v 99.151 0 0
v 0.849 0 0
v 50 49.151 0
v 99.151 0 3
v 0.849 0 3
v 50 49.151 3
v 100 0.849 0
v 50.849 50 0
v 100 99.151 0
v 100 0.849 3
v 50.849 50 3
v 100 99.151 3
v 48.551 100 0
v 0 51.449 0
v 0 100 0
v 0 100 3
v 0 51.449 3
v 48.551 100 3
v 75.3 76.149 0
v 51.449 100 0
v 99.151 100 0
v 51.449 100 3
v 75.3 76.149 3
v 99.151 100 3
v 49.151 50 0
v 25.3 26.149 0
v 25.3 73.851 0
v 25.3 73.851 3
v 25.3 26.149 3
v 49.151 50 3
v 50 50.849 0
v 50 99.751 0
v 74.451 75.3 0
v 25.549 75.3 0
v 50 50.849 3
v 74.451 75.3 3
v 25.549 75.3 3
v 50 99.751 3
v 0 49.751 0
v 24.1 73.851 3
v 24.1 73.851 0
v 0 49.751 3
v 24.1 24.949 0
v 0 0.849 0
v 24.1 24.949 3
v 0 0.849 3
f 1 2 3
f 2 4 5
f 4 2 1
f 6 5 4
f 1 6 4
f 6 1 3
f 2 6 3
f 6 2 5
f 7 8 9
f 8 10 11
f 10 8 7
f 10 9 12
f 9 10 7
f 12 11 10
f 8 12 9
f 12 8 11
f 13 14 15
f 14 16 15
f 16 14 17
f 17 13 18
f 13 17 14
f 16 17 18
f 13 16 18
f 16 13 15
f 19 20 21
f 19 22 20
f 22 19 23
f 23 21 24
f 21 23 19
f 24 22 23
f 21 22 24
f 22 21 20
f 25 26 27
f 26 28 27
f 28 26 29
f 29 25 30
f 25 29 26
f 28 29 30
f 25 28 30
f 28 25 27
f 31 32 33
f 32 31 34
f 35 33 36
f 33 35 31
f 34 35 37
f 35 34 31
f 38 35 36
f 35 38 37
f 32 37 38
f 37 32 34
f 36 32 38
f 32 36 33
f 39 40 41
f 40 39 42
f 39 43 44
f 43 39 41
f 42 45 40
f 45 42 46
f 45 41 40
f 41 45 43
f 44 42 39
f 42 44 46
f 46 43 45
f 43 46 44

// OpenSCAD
/**
 * Genera las piezas del tangram.
 *
 * @author  Joaquín Fernández
 * @url     https://gitlab.com/joaquinfq/openscad/blob/master/Games/Tangram.scad
 * @license CC-BY-NC-4.0
 * @see http://www.thingiverse.com/thing:2122508
 */
//---------------------------------------------------------
// Valores personalizables / Customizable values.
//---------------------------------------------------------
// Tamaño de cada lado.
side = 100;
// Separación entre piezas.
// Se recomienda usar un múltiplo del lineWidth a usar.
sep = 0.6;
// Grosor de las piezas.
thickness = 3;
// Indica si se dibuja la caja o las piezas.
drawBox = 0;
//---------------------------------------------------------
// Ruta de las piezas geométricas.
paths = [
    [
        // Triángulo Inf
        [ 0.00, 0.00 ],
        [ 0.50, 0.50 ],
        [ 1.00, 0.00 ]
    ],
    [
        // Triángulo Der
        [ 0.50, 0.50 ],
        [ 1.00, 1.00 ],
        [ 1.00, 0.00 ]
    ],
    [
        // Triángulo Sup Izq
        [ 0.00, 1.00 ],
        [ 0.50, 1.00 ],
        [ 0.00, 0.50 ]
    ],
    [
        // Triángulo Sup Der
        [ 0.50, 1.00 ],
        [ 1.00, 1.00 ],
        [ 0.75, 0.75 ]
    ],
    [
        // Triángulo Med Izq
        [ 0.25, 0.75 ],
        [ 0.50, 0.50 ],
        [ 0.25, 0.25 ]
    ],
    [
        // Cuadrado
        [ 0.25, 0.75 ],
        [ 0.50, 1.00 ],
        [ 0.75, 0.75 ],
        [ 0.50, 0.50 ]
    ],
    [
        // Paralelogramo
        [ 0.00, 0.00 ],
        [ 0.25, 0.25 ],
        [ 0.25, 0.75 ],
        [ 0.00, 0.50 ]
    ]
];
if (drawBox)
{
    color([ 0.9, 0.9, 0.9 ])
    translate([ -thickness, -thickness, -thickness - 2 ])
    {
        difference()
        {
            cube([ side + 2 * thickness, side + 2 * thickness, 2 * thickness ]);
            translate([ thickness, thickness, thickness ])
            {
                cube([ side, side, 2 * thickness ]);
            }
        }
    }    
}
else
{
    translate([ -sep, -sep ])
    {
        for (i = [ 0 : len(paths) - 1 ])
        {
            color([ (i % 3) * 0.33,  (i % 4) * 0.25,  (i % 5) * 0.2 ])
            {
                linear_extrude(thickness)
                {
                    offset(delta = -sep)
                    {
                        polygon(paths[i] * (side + 2 * sep));
                    }
                }
            }
        }
    }
}
